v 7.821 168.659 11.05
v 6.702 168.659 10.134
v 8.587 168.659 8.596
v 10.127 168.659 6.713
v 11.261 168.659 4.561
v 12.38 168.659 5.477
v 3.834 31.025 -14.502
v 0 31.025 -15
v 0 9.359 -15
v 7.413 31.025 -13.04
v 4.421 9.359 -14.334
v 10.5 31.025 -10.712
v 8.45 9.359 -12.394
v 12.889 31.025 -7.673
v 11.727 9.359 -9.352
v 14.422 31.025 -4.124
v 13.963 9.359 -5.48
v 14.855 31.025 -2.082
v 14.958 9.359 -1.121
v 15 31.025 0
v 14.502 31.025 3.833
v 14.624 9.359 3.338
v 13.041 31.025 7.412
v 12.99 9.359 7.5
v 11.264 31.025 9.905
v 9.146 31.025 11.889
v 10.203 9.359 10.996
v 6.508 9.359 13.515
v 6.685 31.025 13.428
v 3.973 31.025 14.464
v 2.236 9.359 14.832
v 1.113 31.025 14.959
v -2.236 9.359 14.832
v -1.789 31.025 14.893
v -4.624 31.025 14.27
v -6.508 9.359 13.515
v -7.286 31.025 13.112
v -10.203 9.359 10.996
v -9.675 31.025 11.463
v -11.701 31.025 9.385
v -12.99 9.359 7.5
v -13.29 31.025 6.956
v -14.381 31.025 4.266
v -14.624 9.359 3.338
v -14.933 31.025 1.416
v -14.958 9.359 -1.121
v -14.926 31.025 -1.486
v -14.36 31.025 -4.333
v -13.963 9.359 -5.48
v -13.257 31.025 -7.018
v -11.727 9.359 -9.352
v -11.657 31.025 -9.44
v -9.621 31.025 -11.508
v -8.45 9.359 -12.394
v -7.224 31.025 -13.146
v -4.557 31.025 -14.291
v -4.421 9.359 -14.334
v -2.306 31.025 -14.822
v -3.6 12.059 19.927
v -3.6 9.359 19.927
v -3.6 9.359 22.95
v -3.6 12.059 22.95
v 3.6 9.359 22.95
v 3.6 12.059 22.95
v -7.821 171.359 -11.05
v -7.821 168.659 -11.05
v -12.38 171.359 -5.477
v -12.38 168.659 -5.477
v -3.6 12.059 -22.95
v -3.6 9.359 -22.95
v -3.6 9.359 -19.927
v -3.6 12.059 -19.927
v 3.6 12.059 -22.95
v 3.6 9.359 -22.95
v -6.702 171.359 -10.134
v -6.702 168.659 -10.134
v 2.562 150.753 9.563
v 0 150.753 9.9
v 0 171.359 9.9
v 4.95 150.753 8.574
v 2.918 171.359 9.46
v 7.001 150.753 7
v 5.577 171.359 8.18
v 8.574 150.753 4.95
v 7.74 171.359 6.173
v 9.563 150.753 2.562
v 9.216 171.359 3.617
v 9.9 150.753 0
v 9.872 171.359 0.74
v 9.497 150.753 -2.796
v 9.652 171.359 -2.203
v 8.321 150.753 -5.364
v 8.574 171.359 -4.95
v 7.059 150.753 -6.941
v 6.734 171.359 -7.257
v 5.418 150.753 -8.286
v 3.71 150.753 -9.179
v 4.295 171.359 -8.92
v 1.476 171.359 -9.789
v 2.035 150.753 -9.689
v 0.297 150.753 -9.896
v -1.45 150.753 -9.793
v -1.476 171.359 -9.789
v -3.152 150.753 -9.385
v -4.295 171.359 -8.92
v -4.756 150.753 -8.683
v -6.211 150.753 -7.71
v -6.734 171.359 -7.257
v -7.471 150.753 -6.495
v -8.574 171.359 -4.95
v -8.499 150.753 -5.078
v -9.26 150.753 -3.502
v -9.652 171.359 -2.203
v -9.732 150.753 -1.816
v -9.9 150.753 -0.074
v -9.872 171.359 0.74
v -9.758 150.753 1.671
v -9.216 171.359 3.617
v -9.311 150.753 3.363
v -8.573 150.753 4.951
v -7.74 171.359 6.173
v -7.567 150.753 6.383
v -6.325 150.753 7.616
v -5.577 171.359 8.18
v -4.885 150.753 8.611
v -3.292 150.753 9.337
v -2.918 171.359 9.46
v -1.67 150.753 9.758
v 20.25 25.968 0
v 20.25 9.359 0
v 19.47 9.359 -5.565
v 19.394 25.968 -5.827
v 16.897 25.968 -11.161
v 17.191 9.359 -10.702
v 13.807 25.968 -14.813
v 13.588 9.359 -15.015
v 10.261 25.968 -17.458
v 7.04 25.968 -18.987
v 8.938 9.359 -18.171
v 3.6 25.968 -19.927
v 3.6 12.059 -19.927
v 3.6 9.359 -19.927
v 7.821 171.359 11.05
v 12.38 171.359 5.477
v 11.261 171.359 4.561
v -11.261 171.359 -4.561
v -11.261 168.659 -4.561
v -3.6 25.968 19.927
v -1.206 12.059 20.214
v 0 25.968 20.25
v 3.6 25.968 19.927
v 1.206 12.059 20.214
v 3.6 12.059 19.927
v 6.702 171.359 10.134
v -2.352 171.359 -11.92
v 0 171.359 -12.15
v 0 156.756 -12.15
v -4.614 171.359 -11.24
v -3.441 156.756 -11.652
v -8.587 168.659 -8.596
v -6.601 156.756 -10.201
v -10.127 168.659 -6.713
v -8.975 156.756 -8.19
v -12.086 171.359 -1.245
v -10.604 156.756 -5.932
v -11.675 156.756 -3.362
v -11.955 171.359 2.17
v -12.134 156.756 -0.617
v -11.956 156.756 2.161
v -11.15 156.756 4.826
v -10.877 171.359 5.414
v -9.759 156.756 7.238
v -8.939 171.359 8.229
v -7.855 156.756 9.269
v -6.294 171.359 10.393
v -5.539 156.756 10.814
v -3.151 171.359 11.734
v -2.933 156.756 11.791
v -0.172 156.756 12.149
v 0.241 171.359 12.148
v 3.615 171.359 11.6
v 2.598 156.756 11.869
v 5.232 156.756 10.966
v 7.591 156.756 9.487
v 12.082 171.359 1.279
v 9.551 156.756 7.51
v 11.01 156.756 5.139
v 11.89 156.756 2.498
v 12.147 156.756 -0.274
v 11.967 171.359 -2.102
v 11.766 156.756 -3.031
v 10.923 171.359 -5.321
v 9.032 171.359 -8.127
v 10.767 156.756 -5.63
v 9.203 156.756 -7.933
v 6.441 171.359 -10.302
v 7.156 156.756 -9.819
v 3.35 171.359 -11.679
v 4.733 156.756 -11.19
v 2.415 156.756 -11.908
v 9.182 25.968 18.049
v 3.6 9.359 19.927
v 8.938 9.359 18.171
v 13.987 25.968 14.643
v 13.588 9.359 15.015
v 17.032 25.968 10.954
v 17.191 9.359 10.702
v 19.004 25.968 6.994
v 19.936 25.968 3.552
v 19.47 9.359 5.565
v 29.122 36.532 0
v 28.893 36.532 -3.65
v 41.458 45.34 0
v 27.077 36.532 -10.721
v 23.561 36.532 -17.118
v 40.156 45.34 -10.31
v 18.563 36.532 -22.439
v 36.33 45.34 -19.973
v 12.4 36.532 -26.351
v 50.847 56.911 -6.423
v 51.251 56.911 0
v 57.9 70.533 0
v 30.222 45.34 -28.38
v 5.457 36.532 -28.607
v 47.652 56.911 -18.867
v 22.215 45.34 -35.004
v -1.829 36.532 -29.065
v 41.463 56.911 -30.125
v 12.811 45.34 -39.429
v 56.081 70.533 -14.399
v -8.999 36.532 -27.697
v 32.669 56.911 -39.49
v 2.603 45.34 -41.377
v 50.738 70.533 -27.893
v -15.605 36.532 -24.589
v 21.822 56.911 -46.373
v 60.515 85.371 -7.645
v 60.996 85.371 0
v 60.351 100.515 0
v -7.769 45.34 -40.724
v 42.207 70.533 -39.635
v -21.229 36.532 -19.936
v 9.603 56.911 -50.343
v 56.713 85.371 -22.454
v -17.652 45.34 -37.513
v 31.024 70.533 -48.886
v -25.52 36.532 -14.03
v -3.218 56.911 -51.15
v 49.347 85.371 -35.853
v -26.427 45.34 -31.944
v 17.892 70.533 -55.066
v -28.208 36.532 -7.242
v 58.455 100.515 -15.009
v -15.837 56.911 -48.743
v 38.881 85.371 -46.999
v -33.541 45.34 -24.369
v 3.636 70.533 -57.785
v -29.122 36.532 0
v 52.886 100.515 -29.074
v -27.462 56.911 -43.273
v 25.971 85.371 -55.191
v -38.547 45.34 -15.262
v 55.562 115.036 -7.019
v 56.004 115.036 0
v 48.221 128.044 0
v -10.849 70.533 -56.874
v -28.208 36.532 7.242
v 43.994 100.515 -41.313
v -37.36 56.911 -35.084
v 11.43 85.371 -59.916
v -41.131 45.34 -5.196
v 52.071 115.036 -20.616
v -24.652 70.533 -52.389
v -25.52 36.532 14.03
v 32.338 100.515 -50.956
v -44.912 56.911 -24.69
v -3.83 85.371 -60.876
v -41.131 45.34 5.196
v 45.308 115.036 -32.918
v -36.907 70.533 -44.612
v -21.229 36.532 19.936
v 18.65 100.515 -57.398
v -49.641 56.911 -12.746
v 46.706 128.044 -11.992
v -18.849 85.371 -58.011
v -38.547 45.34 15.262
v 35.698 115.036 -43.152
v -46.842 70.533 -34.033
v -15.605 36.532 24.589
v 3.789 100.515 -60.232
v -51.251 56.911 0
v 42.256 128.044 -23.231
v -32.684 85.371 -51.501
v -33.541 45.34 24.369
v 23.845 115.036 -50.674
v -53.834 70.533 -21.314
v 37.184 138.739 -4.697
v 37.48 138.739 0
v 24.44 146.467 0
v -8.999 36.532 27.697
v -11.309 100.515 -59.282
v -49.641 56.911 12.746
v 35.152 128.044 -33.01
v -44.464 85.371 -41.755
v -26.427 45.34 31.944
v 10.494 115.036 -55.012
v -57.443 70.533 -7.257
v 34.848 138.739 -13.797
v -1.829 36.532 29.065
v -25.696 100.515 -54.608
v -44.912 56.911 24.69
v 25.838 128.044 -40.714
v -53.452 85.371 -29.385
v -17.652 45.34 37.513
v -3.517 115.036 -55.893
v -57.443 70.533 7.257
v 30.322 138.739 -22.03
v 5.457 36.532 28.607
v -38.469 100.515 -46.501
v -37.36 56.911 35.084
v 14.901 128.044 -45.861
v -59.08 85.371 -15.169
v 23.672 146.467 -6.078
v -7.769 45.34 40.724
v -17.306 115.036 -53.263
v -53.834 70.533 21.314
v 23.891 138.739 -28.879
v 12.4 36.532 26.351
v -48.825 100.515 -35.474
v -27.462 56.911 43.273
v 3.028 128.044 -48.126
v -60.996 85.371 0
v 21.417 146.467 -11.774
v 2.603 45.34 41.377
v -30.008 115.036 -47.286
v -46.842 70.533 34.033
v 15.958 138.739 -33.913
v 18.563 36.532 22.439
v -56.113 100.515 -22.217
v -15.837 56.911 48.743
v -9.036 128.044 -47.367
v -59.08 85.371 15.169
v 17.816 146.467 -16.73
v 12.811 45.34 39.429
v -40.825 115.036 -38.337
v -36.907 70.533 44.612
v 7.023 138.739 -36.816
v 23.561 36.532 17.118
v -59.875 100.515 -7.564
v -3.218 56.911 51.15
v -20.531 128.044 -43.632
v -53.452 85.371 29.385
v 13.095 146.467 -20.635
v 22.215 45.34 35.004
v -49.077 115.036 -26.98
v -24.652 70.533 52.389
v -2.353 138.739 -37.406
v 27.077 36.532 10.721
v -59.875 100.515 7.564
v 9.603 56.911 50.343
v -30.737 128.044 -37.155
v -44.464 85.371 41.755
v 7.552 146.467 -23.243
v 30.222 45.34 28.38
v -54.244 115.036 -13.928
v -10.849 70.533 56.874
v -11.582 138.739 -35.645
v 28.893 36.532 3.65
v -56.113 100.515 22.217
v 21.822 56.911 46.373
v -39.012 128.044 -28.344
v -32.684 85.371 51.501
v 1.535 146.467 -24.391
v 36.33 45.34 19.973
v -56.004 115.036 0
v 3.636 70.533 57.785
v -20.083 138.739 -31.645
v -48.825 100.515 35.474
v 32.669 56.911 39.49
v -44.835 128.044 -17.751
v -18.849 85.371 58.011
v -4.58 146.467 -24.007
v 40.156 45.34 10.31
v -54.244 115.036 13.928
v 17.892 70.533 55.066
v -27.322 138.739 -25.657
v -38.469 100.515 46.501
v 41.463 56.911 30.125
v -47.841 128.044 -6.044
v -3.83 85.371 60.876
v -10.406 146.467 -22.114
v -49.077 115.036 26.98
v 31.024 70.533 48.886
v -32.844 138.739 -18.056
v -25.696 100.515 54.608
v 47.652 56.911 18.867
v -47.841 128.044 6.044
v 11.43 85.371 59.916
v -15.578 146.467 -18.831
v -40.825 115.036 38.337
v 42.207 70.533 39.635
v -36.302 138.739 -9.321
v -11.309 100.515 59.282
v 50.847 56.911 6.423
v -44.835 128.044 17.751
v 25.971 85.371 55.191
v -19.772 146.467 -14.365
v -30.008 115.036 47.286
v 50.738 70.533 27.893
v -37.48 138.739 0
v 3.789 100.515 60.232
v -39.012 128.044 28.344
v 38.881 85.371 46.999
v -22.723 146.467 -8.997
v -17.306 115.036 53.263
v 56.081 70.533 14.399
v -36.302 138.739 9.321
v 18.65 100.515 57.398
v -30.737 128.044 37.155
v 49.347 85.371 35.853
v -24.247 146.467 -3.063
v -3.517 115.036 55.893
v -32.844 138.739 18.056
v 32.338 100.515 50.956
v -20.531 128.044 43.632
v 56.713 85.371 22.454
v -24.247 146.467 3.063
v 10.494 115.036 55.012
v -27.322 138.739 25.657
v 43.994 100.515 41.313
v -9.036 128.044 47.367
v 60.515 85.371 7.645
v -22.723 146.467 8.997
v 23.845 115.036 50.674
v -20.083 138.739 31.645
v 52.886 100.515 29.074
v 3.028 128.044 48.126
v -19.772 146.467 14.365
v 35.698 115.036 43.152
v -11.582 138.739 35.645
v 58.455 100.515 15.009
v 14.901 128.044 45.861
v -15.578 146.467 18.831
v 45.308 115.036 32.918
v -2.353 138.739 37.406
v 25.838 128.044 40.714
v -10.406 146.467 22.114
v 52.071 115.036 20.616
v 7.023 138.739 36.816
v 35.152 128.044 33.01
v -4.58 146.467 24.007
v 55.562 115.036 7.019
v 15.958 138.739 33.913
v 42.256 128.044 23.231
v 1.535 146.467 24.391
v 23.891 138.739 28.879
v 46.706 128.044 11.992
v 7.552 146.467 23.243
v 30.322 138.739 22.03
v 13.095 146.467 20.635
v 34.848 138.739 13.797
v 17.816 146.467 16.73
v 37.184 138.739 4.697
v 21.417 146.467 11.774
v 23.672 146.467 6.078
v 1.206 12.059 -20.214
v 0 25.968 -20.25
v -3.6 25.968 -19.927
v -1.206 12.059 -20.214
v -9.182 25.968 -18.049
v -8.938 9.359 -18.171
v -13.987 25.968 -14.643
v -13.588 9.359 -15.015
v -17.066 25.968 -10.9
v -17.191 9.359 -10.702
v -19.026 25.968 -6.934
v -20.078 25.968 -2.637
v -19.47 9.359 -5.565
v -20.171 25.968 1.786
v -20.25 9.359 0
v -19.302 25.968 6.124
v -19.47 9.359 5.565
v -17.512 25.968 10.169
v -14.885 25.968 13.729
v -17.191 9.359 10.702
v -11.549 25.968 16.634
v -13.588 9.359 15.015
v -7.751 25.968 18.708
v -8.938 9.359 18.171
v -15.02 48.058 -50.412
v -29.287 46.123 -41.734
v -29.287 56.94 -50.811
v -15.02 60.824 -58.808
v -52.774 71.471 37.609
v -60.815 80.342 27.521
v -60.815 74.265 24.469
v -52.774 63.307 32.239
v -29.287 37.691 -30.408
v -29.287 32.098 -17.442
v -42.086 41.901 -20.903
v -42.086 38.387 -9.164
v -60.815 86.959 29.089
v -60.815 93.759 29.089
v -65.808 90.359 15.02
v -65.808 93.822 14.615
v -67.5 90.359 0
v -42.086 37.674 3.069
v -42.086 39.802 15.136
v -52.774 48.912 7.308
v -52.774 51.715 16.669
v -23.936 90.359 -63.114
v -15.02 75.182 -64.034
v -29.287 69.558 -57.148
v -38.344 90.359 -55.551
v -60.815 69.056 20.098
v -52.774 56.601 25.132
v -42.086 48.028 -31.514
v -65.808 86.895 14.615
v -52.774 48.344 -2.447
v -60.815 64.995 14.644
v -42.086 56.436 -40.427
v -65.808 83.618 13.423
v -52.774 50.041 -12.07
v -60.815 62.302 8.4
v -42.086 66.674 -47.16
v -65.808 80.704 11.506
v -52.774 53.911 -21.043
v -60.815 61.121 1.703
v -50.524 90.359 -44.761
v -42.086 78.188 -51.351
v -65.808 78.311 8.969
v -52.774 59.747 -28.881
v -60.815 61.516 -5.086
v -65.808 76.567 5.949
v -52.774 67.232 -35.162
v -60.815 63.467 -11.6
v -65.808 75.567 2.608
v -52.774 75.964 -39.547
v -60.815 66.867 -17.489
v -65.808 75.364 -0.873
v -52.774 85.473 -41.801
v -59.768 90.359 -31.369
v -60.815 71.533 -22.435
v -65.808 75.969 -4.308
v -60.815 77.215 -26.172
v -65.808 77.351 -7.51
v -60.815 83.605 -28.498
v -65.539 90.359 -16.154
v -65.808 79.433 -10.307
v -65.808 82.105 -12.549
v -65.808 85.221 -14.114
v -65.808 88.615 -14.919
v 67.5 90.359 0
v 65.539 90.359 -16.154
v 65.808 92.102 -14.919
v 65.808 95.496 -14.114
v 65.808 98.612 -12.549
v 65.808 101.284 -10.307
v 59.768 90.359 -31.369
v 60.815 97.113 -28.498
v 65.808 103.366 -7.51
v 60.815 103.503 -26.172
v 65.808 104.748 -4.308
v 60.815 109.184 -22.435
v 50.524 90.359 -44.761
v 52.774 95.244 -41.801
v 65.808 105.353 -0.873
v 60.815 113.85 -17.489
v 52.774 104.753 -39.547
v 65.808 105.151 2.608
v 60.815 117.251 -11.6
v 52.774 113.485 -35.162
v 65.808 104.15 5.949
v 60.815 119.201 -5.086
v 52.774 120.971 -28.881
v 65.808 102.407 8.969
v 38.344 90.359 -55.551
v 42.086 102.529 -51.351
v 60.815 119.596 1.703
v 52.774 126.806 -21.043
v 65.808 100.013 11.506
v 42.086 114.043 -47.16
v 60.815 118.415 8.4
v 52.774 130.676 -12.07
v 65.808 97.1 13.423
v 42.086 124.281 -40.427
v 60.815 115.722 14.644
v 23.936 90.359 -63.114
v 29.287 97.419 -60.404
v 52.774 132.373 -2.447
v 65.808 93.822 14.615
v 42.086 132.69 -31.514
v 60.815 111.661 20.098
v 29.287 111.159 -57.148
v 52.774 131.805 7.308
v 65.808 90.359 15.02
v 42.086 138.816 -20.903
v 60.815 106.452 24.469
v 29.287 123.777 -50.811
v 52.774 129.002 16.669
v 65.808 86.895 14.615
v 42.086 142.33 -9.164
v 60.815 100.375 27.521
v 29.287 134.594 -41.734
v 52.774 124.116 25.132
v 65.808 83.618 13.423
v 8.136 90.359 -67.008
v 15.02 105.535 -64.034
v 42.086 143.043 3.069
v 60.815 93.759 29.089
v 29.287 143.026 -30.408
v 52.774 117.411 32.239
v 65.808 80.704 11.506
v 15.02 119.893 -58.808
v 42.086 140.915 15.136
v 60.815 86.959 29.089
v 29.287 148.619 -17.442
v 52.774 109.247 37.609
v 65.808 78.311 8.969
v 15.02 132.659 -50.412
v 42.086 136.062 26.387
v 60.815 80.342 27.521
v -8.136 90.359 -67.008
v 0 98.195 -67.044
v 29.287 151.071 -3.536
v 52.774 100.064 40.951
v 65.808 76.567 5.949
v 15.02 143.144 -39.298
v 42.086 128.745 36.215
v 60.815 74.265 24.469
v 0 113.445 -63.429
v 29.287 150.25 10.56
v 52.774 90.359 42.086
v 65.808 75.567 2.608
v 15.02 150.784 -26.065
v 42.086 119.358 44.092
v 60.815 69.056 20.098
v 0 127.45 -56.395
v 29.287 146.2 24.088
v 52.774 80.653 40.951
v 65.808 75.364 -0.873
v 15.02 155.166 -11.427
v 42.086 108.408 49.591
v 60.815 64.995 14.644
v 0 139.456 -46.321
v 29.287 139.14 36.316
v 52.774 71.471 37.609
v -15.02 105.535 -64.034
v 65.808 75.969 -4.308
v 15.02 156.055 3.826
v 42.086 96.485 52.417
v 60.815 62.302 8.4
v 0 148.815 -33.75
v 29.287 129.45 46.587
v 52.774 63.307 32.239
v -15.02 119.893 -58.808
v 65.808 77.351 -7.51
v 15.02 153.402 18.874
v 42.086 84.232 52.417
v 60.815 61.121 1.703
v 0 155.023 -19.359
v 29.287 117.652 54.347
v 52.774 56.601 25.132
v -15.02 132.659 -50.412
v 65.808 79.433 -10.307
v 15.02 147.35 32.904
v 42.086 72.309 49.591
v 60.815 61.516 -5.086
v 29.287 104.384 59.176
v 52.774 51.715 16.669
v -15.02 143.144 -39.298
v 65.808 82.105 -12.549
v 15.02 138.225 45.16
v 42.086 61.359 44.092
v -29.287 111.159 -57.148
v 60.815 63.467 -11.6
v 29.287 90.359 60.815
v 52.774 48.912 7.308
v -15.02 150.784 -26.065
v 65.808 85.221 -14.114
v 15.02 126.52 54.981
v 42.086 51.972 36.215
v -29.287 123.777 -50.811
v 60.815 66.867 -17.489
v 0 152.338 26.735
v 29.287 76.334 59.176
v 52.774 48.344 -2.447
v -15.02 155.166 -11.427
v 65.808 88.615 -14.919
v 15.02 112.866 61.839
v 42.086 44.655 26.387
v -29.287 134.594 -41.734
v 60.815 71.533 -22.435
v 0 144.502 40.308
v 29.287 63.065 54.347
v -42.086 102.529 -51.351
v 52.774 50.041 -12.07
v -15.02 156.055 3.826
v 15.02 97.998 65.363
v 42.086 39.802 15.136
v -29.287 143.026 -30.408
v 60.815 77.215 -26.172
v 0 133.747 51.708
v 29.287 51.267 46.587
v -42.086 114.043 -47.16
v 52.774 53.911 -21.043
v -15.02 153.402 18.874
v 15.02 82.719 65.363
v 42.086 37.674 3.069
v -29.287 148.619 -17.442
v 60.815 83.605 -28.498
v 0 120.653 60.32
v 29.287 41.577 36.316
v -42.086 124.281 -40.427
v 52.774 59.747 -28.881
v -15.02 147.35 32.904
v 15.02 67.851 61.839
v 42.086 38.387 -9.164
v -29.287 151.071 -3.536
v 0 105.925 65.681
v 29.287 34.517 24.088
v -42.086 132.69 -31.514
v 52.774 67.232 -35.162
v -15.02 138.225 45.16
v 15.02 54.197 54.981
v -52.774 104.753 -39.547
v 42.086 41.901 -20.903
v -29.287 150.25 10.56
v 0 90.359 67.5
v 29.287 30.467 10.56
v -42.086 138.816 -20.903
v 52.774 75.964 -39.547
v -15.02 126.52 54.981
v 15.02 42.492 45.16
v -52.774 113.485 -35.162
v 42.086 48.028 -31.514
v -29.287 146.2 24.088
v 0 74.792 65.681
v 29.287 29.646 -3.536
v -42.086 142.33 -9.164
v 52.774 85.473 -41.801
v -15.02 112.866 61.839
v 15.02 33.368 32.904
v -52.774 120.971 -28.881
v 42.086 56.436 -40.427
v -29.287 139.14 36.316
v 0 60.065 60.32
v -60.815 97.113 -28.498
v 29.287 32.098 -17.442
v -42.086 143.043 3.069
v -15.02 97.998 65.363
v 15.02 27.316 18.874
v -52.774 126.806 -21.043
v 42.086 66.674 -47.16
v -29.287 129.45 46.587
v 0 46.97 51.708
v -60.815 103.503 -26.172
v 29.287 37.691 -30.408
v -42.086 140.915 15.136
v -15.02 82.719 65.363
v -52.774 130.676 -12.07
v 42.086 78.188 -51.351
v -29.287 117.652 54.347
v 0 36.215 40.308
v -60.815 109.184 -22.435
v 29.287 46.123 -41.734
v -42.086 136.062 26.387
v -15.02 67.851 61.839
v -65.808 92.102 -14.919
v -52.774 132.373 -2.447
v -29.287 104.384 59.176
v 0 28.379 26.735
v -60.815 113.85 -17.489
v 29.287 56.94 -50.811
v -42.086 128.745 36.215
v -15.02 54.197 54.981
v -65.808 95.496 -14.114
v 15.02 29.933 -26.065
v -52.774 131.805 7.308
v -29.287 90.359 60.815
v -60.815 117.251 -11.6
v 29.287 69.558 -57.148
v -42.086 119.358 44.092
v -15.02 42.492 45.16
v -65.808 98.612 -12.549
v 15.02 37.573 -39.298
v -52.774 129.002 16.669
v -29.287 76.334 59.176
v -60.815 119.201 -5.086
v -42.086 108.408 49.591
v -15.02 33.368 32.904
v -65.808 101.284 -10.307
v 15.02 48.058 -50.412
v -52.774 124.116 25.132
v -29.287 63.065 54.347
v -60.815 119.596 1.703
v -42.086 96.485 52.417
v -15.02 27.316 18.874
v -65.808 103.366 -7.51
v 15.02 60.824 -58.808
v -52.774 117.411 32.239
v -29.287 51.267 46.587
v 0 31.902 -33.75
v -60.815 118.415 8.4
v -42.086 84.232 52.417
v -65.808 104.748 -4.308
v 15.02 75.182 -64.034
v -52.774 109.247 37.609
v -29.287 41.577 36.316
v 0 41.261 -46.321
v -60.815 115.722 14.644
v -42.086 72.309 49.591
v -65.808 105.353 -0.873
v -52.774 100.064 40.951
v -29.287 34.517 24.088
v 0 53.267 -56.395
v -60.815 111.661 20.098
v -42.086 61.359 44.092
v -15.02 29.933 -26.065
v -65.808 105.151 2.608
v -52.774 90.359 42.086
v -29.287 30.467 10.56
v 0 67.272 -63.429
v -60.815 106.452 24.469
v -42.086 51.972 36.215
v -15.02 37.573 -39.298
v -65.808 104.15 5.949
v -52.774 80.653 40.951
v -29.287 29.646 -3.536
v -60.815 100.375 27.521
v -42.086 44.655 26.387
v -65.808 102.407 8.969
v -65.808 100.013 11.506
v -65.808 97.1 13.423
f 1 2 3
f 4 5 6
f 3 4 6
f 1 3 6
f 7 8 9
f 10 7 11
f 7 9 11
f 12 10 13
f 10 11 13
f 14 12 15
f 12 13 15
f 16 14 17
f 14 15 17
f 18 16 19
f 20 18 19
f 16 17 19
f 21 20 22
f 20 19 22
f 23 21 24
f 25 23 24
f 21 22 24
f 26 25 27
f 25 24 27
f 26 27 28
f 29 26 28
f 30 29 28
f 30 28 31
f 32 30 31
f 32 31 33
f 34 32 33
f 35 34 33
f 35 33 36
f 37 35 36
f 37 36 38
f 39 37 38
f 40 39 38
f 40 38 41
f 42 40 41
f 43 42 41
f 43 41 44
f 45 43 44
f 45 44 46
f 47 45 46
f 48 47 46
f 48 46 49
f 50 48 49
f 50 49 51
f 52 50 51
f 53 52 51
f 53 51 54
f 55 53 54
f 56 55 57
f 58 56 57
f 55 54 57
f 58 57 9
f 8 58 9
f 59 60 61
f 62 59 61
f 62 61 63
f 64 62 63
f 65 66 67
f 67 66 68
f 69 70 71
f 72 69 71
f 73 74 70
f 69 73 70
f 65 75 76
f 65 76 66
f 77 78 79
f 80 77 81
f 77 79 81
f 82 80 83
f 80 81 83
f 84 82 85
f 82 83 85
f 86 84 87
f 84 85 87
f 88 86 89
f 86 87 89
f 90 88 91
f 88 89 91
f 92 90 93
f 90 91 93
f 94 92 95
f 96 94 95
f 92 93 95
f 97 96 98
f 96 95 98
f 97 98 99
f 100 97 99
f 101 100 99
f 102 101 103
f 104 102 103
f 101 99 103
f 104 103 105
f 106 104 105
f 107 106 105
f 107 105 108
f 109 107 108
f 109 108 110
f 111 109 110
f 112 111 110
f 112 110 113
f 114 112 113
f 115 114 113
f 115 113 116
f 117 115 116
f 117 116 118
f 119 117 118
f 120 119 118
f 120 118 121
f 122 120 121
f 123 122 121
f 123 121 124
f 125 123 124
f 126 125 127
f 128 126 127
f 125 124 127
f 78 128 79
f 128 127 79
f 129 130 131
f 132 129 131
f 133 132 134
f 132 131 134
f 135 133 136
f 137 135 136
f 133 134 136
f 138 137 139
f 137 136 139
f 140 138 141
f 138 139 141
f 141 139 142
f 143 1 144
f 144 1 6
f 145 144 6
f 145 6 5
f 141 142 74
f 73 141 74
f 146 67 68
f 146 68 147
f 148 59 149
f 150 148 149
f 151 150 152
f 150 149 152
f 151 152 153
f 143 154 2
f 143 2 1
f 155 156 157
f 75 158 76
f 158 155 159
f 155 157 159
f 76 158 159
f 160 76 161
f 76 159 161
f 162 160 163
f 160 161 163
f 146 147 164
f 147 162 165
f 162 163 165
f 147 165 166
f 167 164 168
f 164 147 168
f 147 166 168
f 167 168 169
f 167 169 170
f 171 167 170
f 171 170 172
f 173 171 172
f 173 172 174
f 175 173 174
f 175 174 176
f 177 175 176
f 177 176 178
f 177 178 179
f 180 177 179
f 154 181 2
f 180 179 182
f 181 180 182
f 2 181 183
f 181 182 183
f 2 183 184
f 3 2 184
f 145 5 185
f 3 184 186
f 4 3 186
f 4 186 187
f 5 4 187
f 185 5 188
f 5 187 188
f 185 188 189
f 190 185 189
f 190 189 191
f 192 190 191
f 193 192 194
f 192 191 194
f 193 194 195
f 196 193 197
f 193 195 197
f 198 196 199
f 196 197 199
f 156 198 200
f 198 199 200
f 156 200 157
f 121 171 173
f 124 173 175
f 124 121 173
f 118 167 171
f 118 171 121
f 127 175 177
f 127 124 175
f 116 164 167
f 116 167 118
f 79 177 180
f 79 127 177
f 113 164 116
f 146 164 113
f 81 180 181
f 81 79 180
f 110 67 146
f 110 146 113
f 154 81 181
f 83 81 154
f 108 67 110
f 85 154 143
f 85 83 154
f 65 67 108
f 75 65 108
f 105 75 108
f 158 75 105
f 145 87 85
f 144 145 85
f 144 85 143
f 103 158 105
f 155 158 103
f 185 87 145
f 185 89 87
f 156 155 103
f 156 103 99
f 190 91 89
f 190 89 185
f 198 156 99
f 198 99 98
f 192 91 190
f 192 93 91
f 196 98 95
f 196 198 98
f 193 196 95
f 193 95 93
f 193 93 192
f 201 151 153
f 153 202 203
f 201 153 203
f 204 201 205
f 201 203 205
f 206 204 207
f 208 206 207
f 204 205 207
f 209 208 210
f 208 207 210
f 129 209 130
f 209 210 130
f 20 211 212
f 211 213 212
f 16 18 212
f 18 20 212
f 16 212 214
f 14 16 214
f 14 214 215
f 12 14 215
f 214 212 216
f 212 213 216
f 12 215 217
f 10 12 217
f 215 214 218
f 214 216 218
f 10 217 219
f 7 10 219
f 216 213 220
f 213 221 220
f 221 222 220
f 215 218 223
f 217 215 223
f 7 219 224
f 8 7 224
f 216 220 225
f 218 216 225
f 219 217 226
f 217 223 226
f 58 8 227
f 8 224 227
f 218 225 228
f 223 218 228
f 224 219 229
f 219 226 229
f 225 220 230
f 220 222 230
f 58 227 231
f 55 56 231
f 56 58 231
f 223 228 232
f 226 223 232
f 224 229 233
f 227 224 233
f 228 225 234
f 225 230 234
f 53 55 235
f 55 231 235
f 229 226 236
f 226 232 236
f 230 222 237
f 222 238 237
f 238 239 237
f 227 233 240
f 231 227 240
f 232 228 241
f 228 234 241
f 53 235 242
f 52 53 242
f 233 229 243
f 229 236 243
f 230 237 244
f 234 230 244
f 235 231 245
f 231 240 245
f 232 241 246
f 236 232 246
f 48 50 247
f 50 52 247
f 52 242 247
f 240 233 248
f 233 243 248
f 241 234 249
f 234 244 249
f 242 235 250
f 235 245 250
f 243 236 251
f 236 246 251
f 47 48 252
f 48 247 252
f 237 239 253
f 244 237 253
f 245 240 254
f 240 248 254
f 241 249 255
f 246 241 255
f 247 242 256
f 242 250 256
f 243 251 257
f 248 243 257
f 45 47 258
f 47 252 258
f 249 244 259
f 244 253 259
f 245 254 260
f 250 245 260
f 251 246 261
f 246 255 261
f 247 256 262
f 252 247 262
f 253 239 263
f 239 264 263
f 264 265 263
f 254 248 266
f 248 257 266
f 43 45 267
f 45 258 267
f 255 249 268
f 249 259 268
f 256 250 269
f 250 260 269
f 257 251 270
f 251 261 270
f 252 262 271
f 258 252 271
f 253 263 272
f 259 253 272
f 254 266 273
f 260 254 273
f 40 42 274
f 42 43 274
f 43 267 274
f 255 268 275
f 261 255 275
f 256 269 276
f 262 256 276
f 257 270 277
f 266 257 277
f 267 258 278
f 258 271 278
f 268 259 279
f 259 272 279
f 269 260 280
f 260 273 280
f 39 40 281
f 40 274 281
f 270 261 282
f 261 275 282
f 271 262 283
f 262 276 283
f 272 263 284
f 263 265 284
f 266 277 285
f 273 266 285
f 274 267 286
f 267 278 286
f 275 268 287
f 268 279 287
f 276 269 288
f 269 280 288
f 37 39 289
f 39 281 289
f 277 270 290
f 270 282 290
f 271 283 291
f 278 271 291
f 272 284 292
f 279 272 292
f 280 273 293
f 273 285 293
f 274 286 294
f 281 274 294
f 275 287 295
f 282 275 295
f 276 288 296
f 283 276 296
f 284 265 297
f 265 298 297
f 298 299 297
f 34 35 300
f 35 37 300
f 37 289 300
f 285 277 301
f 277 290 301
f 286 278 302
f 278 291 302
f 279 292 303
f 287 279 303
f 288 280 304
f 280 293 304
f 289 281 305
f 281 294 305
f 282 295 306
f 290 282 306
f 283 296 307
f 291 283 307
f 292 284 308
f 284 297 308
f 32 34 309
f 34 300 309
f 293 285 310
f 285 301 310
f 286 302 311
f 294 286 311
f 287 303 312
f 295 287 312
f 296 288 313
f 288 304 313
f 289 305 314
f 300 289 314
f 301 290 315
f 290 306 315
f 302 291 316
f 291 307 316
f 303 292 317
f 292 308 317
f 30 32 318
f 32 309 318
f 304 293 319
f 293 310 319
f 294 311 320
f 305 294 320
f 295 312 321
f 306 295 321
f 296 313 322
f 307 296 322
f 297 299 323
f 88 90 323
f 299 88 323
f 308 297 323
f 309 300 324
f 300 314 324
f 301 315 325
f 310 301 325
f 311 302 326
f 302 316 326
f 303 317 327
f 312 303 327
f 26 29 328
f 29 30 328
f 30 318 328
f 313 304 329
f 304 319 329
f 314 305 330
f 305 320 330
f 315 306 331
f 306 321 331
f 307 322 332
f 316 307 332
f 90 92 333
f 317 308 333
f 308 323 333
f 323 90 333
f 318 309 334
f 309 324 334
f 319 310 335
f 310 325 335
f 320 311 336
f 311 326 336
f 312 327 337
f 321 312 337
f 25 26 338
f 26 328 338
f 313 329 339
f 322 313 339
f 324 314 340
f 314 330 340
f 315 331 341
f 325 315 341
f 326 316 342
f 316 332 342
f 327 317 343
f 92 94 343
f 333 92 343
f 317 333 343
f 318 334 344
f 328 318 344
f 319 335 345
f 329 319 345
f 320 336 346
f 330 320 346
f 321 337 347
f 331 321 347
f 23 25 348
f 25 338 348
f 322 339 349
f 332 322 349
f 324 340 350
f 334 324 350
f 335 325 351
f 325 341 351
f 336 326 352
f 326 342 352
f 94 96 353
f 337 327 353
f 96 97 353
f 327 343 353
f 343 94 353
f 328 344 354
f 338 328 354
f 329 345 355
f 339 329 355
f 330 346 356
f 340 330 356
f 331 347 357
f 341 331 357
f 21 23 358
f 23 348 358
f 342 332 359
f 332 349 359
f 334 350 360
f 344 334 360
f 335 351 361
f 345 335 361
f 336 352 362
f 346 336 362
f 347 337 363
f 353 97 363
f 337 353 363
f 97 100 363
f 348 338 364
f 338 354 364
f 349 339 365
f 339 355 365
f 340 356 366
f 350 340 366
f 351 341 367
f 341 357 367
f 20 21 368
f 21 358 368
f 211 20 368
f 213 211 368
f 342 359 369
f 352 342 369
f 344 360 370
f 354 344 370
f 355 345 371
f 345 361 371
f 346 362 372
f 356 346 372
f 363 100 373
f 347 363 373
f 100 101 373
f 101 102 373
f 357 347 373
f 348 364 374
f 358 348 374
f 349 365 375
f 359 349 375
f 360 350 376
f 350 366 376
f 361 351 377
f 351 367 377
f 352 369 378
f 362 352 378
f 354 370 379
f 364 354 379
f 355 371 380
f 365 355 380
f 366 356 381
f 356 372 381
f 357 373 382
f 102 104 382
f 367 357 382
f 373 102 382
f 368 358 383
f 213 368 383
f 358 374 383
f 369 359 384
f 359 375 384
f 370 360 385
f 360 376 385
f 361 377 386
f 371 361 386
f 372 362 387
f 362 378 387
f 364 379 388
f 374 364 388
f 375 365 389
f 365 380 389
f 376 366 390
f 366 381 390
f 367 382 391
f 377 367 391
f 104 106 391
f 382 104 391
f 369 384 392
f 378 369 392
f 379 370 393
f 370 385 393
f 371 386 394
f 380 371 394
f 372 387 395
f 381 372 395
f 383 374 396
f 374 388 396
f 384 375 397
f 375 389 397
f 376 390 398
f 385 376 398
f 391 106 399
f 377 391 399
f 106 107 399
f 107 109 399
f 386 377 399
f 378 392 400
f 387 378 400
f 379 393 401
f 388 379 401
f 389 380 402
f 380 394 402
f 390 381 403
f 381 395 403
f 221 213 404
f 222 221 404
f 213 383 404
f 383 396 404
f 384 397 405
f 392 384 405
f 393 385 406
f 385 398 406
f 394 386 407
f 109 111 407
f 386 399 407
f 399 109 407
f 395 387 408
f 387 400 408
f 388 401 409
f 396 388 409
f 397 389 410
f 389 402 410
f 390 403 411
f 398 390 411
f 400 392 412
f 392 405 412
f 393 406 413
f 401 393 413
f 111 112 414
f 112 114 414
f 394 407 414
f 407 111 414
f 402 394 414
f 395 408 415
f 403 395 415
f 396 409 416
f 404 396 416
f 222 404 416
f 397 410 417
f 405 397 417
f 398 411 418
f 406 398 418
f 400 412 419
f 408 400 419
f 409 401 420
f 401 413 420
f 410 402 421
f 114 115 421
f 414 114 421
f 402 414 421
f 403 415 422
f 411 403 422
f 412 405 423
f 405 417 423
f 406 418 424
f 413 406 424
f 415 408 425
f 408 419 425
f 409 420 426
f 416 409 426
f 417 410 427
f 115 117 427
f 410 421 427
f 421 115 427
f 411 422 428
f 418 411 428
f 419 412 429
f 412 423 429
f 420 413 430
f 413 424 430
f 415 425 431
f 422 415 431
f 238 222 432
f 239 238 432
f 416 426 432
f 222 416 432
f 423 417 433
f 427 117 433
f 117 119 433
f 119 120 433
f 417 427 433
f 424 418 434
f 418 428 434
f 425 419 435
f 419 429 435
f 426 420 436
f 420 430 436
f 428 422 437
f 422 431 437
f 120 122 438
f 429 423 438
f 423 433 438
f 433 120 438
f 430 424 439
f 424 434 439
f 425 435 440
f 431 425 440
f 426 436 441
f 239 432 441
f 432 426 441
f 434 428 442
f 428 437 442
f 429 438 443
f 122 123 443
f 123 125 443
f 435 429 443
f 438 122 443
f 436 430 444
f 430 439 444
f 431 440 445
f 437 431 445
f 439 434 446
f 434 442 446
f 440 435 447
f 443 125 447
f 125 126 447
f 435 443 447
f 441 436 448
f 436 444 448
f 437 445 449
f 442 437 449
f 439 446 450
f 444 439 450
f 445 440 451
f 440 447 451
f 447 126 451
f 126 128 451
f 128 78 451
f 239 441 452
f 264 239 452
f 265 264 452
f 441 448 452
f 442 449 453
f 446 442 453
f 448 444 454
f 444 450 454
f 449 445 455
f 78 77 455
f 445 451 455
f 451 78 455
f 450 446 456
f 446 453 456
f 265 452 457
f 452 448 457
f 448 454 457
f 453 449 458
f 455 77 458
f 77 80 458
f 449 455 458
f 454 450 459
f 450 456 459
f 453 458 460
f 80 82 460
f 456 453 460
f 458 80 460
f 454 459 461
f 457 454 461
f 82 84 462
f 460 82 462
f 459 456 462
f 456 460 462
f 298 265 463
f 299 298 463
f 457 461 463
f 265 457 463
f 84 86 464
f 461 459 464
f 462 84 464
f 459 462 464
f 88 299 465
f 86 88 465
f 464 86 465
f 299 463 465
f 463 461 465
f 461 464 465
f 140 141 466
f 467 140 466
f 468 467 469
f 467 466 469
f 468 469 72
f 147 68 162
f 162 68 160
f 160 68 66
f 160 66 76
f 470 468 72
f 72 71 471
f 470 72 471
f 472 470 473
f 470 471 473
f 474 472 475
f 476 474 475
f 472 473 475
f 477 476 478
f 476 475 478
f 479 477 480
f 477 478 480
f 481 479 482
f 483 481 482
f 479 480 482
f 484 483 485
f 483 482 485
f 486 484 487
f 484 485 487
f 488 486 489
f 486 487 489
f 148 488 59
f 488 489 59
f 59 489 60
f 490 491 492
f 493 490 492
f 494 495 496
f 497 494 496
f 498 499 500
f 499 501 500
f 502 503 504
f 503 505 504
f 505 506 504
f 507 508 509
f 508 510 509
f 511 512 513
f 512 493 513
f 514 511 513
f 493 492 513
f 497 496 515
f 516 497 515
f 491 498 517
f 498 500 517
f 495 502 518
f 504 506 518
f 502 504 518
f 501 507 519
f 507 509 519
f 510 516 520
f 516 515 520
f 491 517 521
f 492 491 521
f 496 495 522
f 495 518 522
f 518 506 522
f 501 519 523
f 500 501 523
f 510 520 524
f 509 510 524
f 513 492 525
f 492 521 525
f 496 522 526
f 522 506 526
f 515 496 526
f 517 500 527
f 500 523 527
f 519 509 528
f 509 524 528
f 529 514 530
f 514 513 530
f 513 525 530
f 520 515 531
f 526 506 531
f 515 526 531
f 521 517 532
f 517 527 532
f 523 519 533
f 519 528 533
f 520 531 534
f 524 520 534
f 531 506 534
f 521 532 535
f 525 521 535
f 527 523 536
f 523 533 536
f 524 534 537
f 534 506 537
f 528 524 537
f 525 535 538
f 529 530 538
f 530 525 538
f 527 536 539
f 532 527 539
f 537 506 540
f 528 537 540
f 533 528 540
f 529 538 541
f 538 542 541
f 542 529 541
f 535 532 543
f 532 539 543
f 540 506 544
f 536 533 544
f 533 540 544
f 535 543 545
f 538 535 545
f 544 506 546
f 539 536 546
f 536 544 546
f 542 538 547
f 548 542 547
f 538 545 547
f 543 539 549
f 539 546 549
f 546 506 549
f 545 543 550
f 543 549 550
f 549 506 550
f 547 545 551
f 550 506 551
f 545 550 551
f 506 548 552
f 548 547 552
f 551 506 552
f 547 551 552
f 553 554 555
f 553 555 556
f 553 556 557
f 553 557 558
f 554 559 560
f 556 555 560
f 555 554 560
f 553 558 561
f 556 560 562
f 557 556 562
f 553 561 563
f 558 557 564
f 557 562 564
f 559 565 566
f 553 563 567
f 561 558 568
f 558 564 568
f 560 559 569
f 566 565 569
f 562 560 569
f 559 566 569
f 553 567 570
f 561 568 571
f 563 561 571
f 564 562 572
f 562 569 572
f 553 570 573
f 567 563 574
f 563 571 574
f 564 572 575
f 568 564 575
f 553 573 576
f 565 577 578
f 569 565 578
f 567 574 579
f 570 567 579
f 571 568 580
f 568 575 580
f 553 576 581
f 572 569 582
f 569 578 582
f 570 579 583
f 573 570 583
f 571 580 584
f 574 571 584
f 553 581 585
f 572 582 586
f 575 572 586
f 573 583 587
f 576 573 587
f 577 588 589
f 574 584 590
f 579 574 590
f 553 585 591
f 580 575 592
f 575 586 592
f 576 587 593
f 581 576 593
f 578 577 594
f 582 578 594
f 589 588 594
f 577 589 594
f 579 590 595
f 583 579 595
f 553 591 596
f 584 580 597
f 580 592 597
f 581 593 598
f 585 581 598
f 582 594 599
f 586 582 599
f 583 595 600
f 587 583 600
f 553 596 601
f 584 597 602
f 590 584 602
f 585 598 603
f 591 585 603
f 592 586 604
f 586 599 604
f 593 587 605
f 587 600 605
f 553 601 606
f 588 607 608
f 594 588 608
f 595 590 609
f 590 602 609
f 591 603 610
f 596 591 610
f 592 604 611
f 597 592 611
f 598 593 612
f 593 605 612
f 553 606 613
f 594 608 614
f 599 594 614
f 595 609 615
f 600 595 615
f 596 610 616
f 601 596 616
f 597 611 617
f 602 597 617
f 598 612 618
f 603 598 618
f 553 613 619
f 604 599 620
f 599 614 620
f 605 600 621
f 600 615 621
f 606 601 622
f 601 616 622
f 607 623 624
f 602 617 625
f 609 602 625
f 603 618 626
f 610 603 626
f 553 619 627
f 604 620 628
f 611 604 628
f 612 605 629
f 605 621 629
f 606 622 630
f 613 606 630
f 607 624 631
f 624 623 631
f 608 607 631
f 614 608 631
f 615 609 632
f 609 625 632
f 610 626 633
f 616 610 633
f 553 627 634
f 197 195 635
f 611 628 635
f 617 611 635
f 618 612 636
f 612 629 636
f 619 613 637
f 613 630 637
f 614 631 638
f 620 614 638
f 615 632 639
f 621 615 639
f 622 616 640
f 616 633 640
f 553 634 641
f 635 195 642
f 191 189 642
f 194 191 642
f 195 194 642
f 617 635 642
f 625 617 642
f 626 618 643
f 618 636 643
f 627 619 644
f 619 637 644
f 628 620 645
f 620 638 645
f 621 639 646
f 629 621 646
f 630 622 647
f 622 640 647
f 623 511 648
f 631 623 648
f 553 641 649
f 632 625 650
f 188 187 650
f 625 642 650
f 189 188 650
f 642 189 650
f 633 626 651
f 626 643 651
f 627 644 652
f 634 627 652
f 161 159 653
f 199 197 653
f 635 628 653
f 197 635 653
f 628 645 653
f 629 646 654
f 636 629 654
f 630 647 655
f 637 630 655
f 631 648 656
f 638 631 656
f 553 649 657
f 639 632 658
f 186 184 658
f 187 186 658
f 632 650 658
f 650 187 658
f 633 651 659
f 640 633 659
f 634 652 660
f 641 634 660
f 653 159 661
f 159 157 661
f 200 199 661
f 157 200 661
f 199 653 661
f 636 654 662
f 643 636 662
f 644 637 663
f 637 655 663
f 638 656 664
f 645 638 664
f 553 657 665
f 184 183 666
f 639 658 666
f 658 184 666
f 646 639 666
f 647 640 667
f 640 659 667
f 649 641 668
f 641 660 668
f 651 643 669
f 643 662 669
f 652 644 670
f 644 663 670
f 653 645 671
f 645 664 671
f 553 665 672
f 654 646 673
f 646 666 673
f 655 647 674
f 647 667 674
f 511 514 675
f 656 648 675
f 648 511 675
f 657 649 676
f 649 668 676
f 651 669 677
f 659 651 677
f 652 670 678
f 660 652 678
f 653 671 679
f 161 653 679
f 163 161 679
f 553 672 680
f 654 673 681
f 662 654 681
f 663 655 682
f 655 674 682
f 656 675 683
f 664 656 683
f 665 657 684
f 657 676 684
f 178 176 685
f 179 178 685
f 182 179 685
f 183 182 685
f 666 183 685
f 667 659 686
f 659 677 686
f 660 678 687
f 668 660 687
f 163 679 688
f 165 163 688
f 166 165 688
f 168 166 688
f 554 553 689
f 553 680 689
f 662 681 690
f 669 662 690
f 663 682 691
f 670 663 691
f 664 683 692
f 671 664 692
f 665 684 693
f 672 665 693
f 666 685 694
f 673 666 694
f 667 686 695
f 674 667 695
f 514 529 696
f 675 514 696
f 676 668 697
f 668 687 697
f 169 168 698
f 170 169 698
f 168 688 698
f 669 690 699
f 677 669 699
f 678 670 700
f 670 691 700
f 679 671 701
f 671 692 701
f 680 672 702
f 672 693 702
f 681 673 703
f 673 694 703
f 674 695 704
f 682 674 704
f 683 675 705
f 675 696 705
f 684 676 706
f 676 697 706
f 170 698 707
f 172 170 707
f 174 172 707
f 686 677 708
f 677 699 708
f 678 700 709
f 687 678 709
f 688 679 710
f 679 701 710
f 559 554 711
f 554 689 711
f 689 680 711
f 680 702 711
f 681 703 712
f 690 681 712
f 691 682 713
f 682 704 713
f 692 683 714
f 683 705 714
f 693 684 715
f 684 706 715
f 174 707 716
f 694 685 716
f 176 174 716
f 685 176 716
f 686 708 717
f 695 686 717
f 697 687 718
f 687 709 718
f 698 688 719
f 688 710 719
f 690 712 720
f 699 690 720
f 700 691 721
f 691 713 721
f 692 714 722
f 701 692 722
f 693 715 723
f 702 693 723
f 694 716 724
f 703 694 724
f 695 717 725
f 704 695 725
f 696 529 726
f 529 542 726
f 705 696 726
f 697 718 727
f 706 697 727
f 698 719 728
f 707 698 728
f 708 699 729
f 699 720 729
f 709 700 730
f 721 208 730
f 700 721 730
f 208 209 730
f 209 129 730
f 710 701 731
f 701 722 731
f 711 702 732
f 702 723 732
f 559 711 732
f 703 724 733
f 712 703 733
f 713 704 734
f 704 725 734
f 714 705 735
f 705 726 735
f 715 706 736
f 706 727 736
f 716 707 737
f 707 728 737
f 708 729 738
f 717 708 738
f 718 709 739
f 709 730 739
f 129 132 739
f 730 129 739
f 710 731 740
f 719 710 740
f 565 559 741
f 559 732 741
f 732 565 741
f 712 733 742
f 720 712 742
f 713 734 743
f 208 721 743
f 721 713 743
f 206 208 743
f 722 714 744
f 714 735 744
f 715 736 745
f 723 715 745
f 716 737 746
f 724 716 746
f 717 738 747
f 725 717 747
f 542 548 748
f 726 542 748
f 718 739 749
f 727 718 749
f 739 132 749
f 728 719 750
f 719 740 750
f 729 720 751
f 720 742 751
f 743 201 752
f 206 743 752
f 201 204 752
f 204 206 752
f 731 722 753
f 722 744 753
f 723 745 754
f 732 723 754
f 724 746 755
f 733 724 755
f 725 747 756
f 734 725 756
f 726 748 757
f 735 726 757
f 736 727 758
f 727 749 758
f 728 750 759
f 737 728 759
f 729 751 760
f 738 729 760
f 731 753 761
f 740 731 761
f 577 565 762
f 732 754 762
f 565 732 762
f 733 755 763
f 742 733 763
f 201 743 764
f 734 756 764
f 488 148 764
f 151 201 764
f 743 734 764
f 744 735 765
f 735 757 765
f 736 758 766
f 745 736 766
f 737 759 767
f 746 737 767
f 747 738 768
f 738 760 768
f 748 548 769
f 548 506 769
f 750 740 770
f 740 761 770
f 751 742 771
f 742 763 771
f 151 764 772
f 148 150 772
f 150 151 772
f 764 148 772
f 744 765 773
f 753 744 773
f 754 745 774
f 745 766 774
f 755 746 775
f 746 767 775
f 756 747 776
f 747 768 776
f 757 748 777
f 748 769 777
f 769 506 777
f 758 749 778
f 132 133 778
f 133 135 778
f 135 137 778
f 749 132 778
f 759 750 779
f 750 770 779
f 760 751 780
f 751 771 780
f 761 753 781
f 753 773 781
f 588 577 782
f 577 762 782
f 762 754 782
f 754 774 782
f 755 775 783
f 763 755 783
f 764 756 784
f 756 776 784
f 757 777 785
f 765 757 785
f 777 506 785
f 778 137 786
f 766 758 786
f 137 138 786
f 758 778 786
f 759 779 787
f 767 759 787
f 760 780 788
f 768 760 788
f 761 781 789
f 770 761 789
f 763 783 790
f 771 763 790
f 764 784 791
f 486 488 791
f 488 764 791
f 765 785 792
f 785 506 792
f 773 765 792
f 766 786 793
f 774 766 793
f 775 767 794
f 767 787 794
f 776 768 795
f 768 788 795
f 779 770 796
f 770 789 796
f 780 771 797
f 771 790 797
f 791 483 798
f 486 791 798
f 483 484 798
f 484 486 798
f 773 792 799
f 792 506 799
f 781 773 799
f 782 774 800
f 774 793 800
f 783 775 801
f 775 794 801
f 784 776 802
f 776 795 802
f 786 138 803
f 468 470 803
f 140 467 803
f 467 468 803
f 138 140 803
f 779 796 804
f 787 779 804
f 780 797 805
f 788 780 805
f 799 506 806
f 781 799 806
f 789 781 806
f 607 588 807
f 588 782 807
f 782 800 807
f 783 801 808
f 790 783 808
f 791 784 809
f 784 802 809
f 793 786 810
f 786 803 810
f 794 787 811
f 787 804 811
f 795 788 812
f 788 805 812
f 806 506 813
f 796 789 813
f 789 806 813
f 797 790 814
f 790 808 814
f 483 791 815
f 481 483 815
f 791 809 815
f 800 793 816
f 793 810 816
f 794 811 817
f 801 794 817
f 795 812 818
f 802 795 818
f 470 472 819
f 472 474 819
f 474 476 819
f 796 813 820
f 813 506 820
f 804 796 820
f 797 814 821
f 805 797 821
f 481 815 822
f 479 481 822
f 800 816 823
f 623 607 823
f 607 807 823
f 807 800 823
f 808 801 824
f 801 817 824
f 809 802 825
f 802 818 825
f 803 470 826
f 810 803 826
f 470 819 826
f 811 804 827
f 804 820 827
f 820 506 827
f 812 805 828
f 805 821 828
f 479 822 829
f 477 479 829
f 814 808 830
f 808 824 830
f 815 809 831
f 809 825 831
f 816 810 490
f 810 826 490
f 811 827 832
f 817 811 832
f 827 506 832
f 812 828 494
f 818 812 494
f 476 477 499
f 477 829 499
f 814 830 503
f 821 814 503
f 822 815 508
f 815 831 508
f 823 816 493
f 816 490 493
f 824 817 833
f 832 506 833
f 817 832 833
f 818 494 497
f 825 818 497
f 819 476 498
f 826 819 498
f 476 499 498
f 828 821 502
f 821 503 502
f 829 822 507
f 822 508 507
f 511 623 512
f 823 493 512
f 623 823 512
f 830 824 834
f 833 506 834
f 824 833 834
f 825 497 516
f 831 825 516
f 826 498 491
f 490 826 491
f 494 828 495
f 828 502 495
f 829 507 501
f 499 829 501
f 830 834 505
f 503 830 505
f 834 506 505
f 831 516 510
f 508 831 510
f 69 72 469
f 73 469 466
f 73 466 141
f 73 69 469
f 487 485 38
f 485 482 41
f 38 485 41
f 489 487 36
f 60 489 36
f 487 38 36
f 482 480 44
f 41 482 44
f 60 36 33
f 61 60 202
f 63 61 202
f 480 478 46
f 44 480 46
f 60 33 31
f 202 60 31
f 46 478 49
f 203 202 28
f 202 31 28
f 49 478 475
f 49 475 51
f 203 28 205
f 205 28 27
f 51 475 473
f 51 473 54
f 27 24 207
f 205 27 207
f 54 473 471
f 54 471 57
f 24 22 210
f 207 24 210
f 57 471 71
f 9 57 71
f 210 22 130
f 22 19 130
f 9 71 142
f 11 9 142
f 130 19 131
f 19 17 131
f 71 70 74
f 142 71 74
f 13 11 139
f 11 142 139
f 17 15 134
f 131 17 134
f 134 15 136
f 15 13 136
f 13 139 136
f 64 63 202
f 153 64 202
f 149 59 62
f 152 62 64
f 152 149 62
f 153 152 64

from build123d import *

# Parameters (mm, degrees)
BOSS_EXTRUDE1_DEPTH = 90
BOSS_EXTRUDE2_DEPTH = 3
SKETCH3_R           = 13.5
BOSS_EXTRUDE3_DEPTH = 90
BOSS_EXTRUDE4_START = -3
BOSS_EXTRUDE4_DEPTH = 3
SKETCH5_R           = 11
CUT_EXTRUDE1_DEPTH  = 200
SCALE1_SCALE        = 1.5
SKETCH6_R           = 25
CUT_EXTRUDE2_DEPTH  = 65
SCALE2_SCALE        = 0.6


# Read off the part's stored shape, not the designer's step: Shell4
with BuildPart() as part:
    # Sketch1 → Boss-Extrude1 (new body)
    with BuildSketch(Plane(origin=(0, 0, 0), x_dir=(1, 0, 0), z_dir=(0, 1, 0))):
        with BuildLine():
            ThreePointArc((-4, 22.141589825), (-22.5, 0), (-4, -22.141589825))
            Line((-4, -22.141589825), (-4, 22.141589825))
        make_face()
        with BuildLine():
            Line((-4, 22.141589825), (-4, -22.141589825))
            ThreePointArc((-4, -22.141589825), (0, -22.5), (4, -22.141589825))
            Line((4, -22.141589825), (4, 22.141589825))
            ThreePointArc((4, 22.141589825), (0, 22.5), (-4, 22.141589825))
        make_face()
        with BuildLine():
            Line((4, 22.141589825), (4, -22.141589825))
            ThreePointArc((4, -22.141589825), (17.26629665, -14.426538046), (22.5, 0))
            ThreePointArc((22.5, 0), (17.26629665, 14.426538046), (4, 22.141589825))
        make_face()
    extrude(amount=BOSS_EXTRUDE1_DEPTH)

    # Sketch1<3> → Boss-Extrude2 (add)
    with BuildSketch(Plane(origin=(0, 0, 0), x_dir=(1, 0, 0), z_dir=(0, 1, 0))):
        with BuildLine():
            Line((-4, 25.5), (-4, 22.141589825))
            ThreePointArc((-4, 22.141589825), (0, 22.5), (4, 22.141589825))
            Line((4, 22.141589825), (4, 25.5))
            Line((4, 25.5), (-4, 25.5))
        make_face()
        with BuildLine():
            Line((-4, -22.141589825), (-4, -25.5))
            Line((-4, -25.5), (4, -25.5))
            Line((4, -25.5), (4, -22.141589825))
            ThreePointArc((4, -22.141589825), (0, -22.5), (-4, -22.141589825))
        make_face()
    extrude(amount=BOSS_EXTRUDE2_DEPTH)

    # Sketch3 → Boss-Extrude3 (add)
    with BuildSketch(Plane(origin=(0, 90, 0), x_dir=(1, 0, 0), z_dir=(0, 1, 0))):
        with Locations(Location((0, 0, 0), (0, 0, 90))):
            Circle(SKETCH3_R)
    extrude(amount=BOSS_EXTRUDE3_DEPTH)

    # Sketch4 → Boss-Extrude4 (add)
    with BuildSketch(Plane(origin=(0, 180, 0), x_dir=(1, 0, 0), z_dir=(0, 1, 0)).offset(BOSS_EXTRUDE4_START)):
        with BuildLine():
            Line((-8.690152284, 12.277265708), (-13.755690181, 6.085309166))
            Line((-13.755690181, 6.085309166), (-12.345874566, 5.461628073))
            ThreePointArc((-12.345874566, 5.461628073), (-10.448926665, 8.5480952), (-7.799501781, 11.018973272))
            Line((-7.799501781, 11.018973272), (-8.690152284, 12.277265708))
        make_face()
        with BuildLine():
            ThreePointArc((-7.799501781, 11.018973272), (-7.62418516, 11.140996394), (-7.446959855, 11.260230411))
            Line((-7.446959855, 11.260230411), (-8.690152284, 12.277265708))
            Line((-8.690152284, 12.277265708), (-7.799501781, 11.018973272))
        make_face()
        with BuildLine():
            ThreePointArc((12.345874566, -5.461628073), (12.430742152, -5.265610084), (12.512497752, -5.068273869))
            Line((12.512497752, -5.068273869), (-7.446959855, 11.260230411))
            ThreePointArc((-7.446959855, 11.260230411), (-7.62418516, 11.140996394), (-7.799501781, 11.018973272))
            Line((-7.799501781, 11.018973272), (0, 0))
            Line((0, 0), (12.345874566, -5.461628073))
        make_face()
        with BuildLine():
            Line((0, 0), (7.799501781, -11.018973272))
            ThreePointArc((7.799501781, -11.018973272), (10.448926665, -8.5480952), (12.345874566, -5.461628073))
            Line((12.345874566, -5.461628073), (0, 0))
        make_face()
        with BuildLine():
            Line((-12.345874566, 5.461628073), (0, 0))
            Line((0, 0), (-7.799501781, 11.018973272))
            ThreePointArc((-7.799501781, 11.018973272), (-10.448926665, 8.5480952), (-12.345874566, 5.461628073))
        make_face()
        with BuildLine():
            Line((-12.512497752, 5.068273869), (7.446959855, -11.260230411))
            ThreePointArc((7.446959855, -11.260230411), (7.62418516, -11.140996394), (7.799501781, -11.018973272))
            Line((7.799501781, -11.018973272), (0, 0))
            Line((0, 0), (-12.345874566, 5.461628073))
            ThreePointArc((-12.345874566, 5.461628073), (-12.430742152, 5.265610084), (-12.512497752, 5.068273869))
        make_face()
        with BuildLine():
            Line((-13.755690181, 6.085309166), (-12.512497752, 5.068273869))
            ThreePointArc((-12.512497752, 5.068273869), (-12.430742152, 5.265610084), (-12.345874566, 5.461628073))
            Line((-12.345874566, 5.461628073), (-13.755690181, 6.085309166))
        make_face()
        with BuildLine():
            Line((12.345874566, -5.461628073), (13.755690181, -6.085309166))
            Line((13.755690181, -6.085309166), (12.512497752, -5.068273869))
            ThreePointArc((12.512497752, -5.068273869), (12.430742152, -5.265610084), (12.345874566, -5.461628073))
        make_face()
        with BuildLine():
            Line((7.799501781, -11.018973272), (8.690152284, -12.277265708))
            Line((8.690152284, -12.277265708), (13.755690181, -6.085309166))
            Line((13.755690181, -6.085309166), (12.345874566, -5.461628073))
            ThreePointArc((12.345874566, -5.461628073), (10.448926665, -8.5480952), (7.799501781, -11.018973272))
        make_face()
        with BuildLine():
            Line((7.446959855, -11.260230411), (8.690152284, -12.277265708))
            Line((8.690152284, -12.277265708), (7.799501781, -11.018973272))
            ThreePointArc((7.799501781, -11.018973272), (7.62418516, -11.140996394), (7.446959855, -11.260230411))
        make_face()
    extrude(amount=BOSS_EXTRUDE4_DEPTH)

    # Sketch2 one side → Revolve1 (revolve)
    with BuildSketch(Plane(origin=(0, 90, 0), x_dir=(1, 0, 0), z_dir=(0, 1, 0))):
        with BuildLine():
            Line((-22.5, 0), (22.5, 0))
            ThreePointArc((22.5, 0), (0, 22.5), (-22.5, 0))
        make_face()
        with BuildLine():
            Line((-75, 0), (75, 0))
            ThreePointArc((75, 0), (0, 75), (-75, 0))
        make_face()
        with BuildLine():
            ThreePointArc((-22.5, 0), (0, -22.5), (22.5, 0))
            Line((22.5, 0), (-22.5, 0))
        make_face()
    revolve(axis=Axis((-75, 90, 0), (1, 0, 0)))

    # Shell4 outline → Shell4 (revolve, cut)
    with BuildSketch(Plane.XY):
        with BuildLine():
            Line((6.499999977, 157.688625339), (6.5, 173))
            Line((6.5, 173), (0, 173))
            Line((0, 173), (0, 7))
            Line((0, 7), (15.5, 7))
            Line((15.5, 7), (15.499999978, 23.790106474))
            ThreePointArc((15.499999978, 23.790106474), (67.846911043, 94.560335727), (6.499999977, 157.688625339))
        make_face()
    revolve(axis=Axis((0, 0, 0), (0, 1, 0)), mode=Mode.SUBTRACT)

    # Sketch5 → Cut-Extrude1 (cut)
    with BuildSketch(Plane(origin=(0, 180, 0), x_dir=(1, 0, 0), z_dir=(0, 1, 0))):
        with Locations(Location((0, 0, 0), (0, 0, 270))):
            Circle(SKETCH5_R)
    extrude(amount=-CUT_EXTRUDE1_DEPTH, mode=Mode.SUBTRACT)


with BuildPart() as part_1:
    # Scale1: scaled about (-7.769e-06, 87.871063755, -1.7236e-05)
    add(part.part.scale(SCALE1_SCALE).moved(Location((3.884e-06, -43.935531877, 8.618e-06))))

    # Sketch6 → Cut-Extrude2 (cut)
    with BuildSketch(Plane.XZ.offset(43.93576905)):
        with Locations(Location((0, 0, 0), (0, 0, 270))):
            Circle(SKETCH6_R)
    extrude(amount=-CUT_EXTRUDE2_DEPTH, mode=Mode.SUBTRACT)


with BuildPart() as part_2:
    # Scale2: scaled about (-8.009e-06, 89.299768171, -1.5386e-05)
    add(part_1.part.scale(SCALE2_SCALE).moved(Location((-3.204e-06, 35.719907268, -6.154e-06))))


solid = part_2.part
